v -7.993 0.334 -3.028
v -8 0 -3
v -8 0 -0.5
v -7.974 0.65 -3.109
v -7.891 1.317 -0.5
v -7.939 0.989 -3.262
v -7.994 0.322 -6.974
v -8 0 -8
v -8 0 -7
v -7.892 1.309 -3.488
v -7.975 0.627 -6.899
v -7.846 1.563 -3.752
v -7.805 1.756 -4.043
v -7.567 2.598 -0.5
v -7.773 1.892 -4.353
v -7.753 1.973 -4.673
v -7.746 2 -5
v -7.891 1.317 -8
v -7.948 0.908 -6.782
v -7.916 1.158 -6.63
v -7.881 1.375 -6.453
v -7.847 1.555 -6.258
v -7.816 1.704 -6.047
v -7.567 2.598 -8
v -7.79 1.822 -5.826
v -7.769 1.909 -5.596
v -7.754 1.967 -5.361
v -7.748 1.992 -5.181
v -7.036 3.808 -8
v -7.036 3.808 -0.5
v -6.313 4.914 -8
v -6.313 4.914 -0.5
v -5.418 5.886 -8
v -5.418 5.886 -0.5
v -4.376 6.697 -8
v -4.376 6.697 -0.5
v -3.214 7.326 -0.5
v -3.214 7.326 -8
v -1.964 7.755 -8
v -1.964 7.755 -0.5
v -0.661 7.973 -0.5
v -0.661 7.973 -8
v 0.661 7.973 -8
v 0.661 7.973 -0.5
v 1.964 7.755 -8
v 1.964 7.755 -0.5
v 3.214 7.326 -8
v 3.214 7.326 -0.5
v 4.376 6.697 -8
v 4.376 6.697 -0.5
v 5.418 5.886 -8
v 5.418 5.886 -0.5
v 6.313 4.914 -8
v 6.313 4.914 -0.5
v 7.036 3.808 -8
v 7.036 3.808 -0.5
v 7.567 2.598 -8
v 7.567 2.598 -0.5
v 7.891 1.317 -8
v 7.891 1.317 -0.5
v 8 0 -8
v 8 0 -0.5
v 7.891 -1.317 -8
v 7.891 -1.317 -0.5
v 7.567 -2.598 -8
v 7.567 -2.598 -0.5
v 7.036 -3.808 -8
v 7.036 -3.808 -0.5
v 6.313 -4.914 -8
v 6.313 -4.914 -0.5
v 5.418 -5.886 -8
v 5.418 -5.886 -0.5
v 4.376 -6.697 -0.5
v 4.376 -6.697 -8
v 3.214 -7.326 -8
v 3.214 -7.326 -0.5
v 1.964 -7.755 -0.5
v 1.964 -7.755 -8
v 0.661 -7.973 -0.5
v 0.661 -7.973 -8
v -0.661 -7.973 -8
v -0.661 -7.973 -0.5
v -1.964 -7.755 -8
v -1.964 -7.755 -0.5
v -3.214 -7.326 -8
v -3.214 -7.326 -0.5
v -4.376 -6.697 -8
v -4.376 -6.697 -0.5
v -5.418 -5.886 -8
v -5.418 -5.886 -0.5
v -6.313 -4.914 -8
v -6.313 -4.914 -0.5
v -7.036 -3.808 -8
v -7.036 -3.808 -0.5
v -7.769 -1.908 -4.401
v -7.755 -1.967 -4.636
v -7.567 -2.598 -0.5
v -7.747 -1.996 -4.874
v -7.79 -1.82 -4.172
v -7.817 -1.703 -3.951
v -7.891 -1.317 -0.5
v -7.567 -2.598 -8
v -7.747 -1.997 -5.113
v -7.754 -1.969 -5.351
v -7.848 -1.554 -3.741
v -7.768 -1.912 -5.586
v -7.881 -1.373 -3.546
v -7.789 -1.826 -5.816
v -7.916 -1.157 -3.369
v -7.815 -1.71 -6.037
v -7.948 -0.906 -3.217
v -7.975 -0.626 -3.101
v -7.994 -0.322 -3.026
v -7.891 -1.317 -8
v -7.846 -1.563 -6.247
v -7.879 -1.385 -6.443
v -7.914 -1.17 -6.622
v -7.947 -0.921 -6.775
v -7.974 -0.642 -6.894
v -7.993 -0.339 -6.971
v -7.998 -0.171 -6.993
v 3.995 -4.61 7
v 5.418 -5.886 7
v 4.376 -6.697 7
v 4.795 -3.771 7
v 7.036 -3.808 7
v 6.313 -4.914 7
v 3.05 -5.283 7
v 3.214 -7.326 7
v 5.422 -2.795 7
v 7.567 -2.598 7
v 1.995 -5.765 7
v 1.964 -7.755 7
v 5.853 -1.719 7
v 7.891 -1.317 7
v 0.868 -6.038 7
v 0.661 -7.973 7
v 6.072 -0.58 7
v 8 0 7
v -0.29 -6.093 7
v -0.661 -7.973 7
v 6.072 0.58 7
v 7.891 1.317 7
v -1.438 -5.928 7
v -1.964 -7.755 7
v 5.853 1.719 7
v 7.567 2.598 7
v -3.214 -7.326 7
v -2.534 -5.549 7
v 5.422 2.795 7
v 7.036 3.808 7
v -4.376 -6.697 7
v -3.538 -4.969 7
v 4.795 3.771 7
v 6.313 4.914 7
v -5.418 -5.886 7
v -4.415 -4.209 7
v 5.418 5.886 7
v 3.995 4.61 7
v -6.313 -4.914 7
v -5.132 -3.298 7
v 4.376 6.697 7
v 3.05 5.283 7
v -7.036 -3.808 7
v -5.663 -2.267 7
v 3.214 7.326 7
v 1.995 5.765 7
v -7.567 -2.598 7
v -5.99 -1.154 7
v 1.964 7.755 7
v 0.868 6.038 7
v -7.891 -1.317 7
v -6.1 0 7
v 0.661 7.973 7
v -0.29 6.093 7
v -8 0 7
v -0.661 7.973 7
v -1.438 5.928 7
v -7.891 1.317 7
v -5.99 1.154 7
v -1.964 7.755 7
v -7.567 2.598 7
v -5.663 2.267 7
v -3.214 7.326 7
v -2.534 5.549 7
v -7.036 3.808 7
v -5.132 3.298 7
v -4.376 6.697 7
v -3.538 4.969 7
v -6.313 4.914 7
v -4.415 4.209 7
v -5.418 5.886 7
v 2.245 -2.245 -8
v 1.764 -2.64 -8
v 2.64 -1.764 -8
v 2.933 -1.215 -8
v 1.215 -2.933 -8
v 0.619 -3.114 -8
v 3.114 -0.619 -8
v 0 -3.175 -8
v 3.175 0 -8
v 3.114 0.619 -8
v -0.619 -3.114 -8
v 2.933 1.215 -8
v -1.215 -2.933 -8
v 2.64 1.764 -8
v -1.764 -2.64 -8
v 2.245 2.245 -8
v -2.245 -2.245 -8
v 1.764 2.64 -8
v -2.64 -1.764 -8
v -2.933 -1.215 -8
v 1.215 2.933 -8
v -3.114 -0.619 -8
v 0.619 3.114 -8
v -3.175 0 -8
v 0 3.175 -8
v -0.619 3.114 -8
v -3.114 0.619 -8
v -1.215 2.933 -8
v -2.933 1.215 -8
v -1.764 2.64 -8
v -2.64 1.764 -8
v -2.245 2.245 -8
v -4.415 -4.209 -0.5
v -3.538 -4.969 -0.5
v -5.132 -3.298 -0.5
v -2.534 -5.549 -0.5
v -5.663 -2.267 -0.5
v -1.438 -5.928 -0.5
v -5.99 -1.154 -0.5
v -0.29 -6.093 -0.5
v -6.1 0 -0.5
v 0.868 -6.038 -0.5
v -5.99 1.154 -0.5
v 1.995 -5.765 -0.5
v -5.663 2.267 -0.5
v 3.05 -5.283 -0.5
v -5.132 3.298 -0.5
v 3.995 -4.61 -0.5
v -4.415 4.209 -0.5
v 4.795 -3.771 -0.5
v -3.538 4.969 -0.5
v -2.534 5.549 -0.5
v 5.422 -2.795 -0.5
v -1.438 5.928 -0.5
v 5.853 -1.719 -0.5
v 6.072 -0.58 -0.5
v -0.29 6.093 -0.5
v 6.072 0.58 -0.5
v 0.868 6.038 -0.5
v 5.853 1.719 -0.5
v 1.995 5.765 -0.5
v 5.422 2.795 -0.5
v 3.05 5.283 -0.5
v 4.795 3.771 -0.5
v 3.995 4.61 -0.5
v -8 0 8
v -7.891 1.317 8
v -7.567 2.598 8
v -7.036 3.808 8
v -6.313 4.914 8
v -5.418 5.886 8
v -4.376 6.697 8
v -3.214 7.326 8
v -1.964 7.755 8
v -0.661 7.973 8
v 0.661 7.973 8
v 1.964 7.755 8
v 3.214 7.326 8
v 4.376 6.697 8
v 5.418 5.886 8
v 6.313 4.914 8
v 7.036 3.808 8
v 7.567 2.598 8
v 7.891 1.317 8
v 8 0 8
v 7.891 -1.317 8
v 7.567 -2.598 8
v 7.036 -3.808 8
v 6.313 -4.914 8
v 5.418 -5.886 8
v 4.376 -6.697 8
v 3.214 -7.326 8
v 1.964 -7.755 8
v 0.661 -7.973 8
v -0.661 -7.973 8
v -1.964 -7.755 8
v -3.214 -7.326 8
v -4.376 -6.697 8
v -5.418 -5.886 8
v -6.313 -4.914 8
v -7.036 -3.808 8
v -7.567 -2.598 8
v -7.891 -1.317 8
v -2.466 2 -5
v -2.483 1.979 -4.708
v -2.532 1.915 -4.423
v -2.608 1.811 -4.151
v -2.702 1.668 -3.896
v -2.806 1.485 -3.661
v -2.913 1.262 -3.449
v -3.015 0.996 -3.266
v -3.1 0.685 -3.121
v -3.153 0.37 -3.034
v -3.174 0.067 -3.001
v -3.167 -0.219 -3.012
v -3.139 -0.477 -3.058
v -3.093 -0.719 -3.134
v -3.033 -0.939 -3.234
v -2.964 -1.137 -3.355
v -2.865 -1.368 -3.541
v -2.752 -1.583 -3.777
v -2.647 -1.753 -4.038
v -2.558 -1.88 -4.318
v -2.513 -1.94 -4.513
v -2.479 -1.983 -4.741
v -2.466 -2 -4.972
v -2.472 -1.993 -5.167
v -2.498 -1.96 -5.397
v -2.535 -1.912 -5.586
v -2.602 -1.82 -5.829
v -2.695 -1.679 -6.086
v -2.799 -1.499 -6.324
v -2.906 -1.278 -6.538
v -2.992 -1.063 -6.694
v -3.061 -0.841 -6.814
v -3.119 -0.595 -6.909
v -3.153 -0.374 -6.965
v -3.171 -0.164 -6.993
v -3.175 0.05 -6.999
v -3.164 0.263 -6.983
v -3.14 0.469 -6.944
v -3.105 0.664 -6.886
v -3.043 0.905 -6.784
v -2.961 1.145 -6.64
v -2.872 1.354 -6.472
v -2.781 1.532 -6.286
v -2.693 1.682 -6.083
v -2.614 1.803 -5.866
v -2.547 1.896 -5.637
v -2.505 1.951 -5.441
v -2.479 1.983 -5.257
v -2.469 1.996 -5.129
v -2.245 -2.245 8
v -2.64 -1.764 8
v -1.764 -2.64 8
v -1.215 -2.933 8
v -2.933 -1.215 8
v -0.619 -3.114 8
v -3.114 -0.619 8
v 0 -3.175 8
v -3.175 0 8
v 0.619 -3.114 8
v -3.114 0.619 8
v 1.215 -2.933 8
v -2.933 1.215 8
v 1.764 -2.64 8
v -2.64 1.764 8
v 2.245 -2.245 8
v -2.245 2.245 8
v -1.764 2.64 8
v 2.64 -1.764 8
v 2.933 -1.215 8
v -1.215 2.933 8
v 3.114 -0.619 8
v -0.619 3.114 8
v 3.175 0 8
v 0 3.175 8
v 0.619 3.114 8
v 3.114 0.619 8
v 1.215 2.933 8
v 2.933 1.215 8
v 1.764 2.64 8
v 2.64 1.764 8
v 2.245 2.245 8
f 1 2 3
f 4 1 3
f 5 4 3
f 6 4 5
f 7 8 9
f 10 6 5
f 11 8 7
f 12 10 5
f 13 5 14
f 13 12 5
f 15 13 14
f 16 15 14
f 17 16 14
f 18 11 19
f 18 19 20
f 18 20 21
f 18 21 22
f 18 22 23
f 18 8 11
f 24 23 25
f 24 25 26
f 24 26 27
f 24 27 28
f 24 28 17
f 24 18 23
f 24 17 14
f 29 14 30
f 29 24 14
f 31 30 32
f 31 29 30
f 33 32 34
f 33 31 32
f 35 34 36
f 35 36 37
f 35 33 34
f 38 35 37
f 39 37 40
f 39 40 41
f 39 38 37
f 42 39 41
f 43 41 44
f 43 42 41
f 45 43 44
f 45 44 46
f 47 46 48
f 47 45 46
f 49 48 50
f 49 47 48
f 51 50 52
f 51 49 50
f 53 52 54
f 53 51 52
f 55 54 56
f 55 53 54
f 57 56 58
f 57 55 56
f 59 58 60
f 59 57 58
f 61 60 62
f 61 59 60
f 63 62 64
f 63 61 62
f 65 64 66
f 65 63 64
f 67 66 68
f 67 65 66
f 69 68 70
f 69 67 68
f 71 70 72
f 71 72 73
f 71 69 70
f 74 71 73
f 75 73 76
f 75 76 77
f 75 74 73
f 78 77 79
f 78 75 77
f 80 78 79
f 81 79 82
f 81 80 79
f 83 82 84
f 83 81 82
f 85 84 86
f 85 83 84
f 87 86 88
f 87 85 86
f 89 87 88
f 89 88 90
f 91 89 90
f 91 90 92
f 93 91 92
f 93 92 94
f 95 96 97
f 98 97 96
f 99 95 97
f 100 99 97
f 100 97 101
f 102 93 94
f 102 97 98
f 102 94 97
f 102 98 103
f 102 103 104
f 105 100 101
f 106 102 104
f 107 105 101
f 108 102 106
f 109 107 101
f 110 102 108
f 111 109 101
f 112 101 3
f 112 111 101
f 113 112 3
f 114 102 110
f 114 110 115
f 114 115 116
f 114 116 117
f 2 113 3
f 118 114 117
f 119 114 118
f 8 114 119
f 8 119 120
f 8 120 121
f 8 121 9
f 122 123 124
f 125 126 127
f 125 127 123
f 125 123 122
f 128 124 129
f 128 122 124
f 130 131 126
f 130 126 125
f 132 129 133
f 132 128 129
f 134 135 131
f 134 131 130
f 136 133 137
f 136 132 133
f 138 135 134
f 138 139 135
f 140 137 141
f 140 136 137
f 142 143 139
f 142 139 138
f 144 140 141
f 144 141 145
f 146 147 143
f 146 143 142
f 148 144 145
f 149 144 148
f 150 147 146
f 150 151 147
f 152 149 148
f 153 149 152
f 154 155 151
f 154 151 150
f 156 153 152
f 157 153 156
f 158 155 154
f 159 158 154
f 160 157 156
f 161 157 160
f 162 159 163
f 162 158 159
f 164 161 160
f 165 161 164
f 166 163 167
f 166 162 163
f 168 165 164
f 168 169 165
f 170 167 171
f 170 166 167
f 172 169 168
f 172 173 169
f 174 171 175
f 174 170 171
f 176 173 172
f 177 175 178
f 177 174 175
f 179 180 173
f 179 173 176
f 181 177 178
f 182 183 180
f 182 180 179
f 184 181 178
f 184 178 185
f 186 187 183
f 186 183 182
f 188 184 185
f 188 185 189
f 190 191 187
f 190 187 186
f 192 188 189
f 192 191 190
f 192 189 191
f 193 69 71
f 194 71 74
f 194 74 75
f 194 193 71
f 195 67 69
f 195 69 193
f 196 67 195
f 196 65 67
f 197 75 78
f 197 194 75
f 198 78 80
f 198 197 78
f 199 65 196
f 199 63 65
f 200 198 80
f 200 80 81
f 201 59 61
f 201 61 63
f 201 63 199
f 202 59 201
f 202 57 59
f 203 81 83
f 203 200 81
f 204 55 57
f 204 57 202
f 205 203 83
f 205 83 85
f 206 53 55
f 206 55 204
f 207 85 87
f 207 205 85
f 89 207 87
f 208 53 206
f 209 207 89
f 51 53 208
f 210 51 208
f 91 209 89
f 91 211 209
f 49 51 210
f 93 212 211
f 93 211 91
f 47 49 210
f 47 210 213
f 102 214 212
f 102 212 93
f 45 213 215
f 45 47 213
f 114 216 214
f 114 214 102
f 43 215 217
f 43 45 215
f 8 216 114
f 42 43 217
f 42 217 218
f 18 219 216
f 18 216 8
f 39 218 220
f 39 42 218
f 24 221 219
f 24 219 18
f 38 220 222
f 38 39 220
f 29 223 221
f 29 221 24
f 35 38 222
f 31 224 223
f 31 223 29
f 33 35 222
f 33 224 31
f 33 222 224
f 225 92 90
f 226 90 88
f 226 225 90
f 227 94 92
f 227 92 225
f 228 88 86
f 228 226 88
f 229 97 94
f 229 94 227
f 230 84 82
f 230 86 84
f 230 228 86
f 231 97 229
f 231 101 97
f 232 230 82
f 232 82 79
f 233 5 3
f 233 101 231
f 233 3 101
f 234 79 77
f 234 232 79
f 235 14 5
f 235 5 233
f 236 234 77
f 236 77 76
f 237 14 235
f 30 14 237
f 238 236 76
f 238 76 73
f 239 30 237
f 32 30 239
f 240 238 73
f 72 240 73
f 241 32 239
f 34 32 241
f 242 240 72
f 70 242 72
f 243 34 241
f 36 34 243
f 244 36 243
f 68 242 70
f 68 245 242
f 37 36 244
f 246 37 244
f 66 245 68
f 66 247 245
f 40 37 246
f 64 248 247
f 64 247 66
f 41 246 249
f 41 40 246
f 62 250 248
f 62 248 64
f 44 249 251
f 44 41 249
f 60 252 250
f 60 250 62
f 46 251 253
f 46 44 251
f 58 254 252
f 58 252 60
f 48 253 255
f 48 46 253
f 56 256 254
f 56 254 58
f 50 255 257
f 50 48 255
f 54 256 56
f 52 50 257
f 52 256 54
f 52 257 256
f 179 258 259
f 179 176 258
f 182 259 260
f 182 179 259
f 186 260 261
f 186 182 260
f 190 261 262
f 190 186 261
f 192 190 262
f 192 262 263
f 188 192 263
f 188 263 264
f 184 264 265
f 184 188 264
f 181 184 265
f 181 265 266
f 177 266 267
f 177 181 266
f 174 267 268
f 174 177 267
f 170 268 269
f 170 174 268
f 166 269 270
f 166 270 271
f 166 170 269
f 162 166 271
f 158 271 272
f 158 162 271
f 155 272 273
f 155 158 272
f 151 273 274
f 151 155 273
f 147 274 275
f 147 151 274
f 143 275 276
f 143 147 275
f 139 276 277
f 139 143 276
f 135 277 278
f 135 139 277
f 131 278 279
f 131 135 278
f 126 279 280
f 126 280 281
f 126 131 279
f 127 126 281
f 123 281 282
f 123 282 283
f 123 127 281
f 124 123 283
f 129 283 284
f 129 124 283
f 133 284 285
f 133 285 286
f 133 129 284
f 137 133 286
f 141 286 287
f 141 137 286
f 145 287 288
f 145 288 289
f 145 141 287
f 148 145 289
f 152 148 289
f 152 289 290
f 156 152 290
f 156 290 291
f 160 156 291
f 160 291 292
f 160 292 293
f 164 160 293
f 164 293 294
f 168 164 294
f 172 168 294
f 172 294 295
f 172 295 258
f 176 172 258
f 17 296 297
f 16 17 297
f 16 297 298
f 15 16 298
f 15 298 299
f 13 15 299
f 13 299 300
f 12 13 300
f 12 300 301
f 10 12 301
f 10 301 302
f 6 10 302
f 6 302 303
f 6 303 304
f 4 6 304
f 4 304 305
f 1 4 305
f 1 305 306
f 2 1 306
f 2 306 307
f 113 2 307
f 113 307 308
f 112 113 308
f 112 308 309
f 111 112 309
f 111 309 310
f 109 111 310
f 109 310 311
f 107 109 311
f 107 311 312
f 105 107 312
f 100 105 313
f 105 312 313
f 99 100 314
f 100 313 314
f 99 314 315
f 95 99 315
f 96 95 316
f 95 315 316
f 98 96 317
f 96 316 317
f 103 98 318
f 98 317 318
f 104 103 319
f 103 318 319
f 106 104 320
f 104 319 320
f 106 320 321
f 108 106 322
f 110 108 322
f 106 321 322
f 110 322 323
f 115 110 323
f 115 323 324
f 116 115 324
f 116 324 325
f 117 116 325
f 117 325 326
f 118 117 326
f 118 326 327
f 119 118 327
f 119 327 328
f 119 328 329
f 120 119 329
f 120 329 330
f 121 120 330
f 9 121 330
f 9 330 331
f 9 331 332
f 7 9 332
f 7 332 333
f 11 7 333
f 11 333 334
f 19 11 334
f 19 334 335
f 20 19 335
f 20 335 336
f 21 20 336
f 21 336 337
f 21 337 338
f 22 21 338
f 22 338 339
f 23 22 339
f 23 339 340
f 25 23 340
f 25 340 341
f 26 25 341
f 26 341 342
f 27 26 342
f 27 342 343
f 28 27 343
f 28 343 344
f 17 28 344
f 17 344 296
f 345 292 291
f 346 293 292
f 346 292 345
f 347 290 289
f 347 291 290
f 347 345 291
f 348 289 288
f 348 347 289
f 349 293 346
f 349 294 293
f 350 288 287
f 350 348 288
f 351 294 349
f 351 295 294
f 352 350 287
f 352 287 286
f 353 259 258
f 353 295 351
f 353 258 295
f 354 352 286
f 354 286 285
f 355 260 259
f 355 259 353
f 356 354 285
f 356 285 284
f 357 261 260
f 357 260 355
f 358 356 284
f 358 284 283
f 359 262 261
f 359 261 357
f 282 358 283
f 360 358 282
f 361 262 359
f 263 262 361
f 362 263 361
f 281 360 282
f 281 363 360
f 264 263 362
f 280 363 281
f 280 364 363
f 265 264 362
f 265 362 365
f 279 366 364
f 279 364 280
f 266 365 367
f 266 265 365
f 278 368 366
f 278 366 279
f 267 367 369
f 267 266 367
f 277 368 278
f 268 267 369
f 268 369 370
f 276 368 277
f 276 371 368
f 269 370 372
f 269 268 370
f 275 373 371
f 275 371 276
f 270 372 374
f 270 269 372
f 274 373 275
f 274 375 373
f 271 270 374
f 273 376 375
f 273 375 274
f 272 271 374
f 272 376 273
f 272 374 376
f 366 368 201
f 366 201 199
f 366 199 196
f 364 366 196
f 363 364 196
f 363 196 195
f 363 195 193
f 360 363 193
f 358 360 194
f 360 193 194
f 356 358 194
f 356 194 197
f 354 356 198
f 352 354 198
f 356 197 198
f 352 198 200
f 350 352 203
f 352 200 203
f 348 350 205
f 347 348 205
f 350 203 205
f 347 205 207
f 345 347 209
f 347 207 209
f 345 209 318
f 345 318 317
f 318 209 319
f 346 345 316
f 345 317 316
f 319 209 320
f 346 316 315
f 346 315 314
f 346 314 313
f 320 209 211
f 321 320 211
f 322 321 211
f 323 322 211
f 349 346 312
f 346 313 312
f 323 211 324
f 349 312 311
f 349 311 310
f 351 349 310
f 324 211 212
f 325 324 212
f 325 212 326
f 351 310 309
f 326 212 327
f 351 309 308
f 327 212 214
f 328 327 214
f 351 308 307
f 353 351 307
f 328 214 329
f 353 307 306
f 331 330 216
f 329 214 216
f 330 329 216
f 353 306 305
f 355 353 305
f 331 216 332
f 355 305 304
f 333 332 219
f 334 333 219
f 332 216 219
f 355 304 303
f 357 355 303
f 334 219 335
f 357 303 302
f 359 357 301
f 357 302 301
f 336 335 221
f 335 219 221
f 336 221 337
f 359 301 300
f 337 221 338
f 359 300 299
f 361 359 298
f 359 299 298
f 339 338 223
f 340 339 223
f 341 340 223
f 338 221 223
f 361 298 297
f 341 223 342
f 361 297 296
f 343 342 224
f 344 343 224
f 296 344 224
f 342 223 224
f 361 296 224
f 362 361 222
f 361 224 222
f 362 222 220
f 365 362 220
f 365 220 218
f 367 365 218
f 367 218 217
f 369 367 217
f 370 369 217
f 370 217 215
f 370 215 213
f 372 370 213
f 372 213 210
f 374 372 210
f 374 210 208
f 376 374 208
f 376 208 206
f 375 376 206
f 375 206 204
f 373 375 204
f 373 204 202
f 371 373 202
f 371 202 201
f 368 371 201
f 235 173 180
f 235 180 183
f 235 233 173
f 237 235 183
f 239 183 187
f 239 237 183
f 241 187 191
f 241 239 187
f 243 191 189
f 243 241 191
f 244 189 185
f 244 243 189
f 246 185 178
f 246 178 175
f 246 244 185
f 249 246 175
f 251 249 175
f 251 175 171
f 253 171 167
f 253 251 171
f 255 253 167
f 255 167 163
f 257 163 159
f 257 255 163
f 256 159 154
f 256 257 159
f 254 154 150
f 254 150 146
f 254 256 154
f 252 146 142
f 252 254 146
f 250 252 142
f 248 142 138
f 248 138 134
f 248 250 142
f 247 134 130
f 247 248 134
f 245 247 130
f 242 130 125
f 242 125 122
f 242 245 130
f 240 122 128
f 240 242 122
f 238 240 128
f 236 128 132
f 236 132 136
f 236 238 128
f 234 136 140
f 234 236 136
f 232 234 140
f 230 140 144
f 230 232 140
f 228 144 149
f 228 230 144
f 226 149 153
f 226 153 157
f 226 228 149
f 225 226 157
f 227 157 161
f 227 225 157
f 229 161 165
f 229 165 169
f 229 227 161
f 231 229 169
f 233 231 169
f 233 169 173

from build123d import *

# Parameters (mm, degrees)
F2_R     = 3.175
F3_DEPTH = 25
F4_R     = 2
F5_DEPTH = 25


with BuildPart() as f1:
    # F0 (on Front) → F1 (revolve)
    with BuildSketch(Plane.XZ):
        Polygon((-8, -8), (0, -8), (0, 8), (-8, 8), (-8, 7), (-6.1, 7), (-6.1, -0.5), (-8, -0.5), align=None)
    revolve(axis=Axis((0, 0, -0.818246), (0, 0, -1)))

    # F2 (on face) → F3 (cut)
    with BuildSketch(Plane(origin=(0, 0, -8), x_dir=(1, 0, 0), z_dir=(0, 0, -1))):
        Circle(F2_R)
    extrude(amount=-F3_DEPTH, mode=Mode.SUBTRACT)

    # F4 (on Right) → F5 (cut)
    with BuildSketch(Plane.YZ):
        with Locations((0, -5)):
            Circle(F4_R)
    extrude(amount=-F5_DEPTH, mode=Mode.SUBTRACT)


solid = f1.part
